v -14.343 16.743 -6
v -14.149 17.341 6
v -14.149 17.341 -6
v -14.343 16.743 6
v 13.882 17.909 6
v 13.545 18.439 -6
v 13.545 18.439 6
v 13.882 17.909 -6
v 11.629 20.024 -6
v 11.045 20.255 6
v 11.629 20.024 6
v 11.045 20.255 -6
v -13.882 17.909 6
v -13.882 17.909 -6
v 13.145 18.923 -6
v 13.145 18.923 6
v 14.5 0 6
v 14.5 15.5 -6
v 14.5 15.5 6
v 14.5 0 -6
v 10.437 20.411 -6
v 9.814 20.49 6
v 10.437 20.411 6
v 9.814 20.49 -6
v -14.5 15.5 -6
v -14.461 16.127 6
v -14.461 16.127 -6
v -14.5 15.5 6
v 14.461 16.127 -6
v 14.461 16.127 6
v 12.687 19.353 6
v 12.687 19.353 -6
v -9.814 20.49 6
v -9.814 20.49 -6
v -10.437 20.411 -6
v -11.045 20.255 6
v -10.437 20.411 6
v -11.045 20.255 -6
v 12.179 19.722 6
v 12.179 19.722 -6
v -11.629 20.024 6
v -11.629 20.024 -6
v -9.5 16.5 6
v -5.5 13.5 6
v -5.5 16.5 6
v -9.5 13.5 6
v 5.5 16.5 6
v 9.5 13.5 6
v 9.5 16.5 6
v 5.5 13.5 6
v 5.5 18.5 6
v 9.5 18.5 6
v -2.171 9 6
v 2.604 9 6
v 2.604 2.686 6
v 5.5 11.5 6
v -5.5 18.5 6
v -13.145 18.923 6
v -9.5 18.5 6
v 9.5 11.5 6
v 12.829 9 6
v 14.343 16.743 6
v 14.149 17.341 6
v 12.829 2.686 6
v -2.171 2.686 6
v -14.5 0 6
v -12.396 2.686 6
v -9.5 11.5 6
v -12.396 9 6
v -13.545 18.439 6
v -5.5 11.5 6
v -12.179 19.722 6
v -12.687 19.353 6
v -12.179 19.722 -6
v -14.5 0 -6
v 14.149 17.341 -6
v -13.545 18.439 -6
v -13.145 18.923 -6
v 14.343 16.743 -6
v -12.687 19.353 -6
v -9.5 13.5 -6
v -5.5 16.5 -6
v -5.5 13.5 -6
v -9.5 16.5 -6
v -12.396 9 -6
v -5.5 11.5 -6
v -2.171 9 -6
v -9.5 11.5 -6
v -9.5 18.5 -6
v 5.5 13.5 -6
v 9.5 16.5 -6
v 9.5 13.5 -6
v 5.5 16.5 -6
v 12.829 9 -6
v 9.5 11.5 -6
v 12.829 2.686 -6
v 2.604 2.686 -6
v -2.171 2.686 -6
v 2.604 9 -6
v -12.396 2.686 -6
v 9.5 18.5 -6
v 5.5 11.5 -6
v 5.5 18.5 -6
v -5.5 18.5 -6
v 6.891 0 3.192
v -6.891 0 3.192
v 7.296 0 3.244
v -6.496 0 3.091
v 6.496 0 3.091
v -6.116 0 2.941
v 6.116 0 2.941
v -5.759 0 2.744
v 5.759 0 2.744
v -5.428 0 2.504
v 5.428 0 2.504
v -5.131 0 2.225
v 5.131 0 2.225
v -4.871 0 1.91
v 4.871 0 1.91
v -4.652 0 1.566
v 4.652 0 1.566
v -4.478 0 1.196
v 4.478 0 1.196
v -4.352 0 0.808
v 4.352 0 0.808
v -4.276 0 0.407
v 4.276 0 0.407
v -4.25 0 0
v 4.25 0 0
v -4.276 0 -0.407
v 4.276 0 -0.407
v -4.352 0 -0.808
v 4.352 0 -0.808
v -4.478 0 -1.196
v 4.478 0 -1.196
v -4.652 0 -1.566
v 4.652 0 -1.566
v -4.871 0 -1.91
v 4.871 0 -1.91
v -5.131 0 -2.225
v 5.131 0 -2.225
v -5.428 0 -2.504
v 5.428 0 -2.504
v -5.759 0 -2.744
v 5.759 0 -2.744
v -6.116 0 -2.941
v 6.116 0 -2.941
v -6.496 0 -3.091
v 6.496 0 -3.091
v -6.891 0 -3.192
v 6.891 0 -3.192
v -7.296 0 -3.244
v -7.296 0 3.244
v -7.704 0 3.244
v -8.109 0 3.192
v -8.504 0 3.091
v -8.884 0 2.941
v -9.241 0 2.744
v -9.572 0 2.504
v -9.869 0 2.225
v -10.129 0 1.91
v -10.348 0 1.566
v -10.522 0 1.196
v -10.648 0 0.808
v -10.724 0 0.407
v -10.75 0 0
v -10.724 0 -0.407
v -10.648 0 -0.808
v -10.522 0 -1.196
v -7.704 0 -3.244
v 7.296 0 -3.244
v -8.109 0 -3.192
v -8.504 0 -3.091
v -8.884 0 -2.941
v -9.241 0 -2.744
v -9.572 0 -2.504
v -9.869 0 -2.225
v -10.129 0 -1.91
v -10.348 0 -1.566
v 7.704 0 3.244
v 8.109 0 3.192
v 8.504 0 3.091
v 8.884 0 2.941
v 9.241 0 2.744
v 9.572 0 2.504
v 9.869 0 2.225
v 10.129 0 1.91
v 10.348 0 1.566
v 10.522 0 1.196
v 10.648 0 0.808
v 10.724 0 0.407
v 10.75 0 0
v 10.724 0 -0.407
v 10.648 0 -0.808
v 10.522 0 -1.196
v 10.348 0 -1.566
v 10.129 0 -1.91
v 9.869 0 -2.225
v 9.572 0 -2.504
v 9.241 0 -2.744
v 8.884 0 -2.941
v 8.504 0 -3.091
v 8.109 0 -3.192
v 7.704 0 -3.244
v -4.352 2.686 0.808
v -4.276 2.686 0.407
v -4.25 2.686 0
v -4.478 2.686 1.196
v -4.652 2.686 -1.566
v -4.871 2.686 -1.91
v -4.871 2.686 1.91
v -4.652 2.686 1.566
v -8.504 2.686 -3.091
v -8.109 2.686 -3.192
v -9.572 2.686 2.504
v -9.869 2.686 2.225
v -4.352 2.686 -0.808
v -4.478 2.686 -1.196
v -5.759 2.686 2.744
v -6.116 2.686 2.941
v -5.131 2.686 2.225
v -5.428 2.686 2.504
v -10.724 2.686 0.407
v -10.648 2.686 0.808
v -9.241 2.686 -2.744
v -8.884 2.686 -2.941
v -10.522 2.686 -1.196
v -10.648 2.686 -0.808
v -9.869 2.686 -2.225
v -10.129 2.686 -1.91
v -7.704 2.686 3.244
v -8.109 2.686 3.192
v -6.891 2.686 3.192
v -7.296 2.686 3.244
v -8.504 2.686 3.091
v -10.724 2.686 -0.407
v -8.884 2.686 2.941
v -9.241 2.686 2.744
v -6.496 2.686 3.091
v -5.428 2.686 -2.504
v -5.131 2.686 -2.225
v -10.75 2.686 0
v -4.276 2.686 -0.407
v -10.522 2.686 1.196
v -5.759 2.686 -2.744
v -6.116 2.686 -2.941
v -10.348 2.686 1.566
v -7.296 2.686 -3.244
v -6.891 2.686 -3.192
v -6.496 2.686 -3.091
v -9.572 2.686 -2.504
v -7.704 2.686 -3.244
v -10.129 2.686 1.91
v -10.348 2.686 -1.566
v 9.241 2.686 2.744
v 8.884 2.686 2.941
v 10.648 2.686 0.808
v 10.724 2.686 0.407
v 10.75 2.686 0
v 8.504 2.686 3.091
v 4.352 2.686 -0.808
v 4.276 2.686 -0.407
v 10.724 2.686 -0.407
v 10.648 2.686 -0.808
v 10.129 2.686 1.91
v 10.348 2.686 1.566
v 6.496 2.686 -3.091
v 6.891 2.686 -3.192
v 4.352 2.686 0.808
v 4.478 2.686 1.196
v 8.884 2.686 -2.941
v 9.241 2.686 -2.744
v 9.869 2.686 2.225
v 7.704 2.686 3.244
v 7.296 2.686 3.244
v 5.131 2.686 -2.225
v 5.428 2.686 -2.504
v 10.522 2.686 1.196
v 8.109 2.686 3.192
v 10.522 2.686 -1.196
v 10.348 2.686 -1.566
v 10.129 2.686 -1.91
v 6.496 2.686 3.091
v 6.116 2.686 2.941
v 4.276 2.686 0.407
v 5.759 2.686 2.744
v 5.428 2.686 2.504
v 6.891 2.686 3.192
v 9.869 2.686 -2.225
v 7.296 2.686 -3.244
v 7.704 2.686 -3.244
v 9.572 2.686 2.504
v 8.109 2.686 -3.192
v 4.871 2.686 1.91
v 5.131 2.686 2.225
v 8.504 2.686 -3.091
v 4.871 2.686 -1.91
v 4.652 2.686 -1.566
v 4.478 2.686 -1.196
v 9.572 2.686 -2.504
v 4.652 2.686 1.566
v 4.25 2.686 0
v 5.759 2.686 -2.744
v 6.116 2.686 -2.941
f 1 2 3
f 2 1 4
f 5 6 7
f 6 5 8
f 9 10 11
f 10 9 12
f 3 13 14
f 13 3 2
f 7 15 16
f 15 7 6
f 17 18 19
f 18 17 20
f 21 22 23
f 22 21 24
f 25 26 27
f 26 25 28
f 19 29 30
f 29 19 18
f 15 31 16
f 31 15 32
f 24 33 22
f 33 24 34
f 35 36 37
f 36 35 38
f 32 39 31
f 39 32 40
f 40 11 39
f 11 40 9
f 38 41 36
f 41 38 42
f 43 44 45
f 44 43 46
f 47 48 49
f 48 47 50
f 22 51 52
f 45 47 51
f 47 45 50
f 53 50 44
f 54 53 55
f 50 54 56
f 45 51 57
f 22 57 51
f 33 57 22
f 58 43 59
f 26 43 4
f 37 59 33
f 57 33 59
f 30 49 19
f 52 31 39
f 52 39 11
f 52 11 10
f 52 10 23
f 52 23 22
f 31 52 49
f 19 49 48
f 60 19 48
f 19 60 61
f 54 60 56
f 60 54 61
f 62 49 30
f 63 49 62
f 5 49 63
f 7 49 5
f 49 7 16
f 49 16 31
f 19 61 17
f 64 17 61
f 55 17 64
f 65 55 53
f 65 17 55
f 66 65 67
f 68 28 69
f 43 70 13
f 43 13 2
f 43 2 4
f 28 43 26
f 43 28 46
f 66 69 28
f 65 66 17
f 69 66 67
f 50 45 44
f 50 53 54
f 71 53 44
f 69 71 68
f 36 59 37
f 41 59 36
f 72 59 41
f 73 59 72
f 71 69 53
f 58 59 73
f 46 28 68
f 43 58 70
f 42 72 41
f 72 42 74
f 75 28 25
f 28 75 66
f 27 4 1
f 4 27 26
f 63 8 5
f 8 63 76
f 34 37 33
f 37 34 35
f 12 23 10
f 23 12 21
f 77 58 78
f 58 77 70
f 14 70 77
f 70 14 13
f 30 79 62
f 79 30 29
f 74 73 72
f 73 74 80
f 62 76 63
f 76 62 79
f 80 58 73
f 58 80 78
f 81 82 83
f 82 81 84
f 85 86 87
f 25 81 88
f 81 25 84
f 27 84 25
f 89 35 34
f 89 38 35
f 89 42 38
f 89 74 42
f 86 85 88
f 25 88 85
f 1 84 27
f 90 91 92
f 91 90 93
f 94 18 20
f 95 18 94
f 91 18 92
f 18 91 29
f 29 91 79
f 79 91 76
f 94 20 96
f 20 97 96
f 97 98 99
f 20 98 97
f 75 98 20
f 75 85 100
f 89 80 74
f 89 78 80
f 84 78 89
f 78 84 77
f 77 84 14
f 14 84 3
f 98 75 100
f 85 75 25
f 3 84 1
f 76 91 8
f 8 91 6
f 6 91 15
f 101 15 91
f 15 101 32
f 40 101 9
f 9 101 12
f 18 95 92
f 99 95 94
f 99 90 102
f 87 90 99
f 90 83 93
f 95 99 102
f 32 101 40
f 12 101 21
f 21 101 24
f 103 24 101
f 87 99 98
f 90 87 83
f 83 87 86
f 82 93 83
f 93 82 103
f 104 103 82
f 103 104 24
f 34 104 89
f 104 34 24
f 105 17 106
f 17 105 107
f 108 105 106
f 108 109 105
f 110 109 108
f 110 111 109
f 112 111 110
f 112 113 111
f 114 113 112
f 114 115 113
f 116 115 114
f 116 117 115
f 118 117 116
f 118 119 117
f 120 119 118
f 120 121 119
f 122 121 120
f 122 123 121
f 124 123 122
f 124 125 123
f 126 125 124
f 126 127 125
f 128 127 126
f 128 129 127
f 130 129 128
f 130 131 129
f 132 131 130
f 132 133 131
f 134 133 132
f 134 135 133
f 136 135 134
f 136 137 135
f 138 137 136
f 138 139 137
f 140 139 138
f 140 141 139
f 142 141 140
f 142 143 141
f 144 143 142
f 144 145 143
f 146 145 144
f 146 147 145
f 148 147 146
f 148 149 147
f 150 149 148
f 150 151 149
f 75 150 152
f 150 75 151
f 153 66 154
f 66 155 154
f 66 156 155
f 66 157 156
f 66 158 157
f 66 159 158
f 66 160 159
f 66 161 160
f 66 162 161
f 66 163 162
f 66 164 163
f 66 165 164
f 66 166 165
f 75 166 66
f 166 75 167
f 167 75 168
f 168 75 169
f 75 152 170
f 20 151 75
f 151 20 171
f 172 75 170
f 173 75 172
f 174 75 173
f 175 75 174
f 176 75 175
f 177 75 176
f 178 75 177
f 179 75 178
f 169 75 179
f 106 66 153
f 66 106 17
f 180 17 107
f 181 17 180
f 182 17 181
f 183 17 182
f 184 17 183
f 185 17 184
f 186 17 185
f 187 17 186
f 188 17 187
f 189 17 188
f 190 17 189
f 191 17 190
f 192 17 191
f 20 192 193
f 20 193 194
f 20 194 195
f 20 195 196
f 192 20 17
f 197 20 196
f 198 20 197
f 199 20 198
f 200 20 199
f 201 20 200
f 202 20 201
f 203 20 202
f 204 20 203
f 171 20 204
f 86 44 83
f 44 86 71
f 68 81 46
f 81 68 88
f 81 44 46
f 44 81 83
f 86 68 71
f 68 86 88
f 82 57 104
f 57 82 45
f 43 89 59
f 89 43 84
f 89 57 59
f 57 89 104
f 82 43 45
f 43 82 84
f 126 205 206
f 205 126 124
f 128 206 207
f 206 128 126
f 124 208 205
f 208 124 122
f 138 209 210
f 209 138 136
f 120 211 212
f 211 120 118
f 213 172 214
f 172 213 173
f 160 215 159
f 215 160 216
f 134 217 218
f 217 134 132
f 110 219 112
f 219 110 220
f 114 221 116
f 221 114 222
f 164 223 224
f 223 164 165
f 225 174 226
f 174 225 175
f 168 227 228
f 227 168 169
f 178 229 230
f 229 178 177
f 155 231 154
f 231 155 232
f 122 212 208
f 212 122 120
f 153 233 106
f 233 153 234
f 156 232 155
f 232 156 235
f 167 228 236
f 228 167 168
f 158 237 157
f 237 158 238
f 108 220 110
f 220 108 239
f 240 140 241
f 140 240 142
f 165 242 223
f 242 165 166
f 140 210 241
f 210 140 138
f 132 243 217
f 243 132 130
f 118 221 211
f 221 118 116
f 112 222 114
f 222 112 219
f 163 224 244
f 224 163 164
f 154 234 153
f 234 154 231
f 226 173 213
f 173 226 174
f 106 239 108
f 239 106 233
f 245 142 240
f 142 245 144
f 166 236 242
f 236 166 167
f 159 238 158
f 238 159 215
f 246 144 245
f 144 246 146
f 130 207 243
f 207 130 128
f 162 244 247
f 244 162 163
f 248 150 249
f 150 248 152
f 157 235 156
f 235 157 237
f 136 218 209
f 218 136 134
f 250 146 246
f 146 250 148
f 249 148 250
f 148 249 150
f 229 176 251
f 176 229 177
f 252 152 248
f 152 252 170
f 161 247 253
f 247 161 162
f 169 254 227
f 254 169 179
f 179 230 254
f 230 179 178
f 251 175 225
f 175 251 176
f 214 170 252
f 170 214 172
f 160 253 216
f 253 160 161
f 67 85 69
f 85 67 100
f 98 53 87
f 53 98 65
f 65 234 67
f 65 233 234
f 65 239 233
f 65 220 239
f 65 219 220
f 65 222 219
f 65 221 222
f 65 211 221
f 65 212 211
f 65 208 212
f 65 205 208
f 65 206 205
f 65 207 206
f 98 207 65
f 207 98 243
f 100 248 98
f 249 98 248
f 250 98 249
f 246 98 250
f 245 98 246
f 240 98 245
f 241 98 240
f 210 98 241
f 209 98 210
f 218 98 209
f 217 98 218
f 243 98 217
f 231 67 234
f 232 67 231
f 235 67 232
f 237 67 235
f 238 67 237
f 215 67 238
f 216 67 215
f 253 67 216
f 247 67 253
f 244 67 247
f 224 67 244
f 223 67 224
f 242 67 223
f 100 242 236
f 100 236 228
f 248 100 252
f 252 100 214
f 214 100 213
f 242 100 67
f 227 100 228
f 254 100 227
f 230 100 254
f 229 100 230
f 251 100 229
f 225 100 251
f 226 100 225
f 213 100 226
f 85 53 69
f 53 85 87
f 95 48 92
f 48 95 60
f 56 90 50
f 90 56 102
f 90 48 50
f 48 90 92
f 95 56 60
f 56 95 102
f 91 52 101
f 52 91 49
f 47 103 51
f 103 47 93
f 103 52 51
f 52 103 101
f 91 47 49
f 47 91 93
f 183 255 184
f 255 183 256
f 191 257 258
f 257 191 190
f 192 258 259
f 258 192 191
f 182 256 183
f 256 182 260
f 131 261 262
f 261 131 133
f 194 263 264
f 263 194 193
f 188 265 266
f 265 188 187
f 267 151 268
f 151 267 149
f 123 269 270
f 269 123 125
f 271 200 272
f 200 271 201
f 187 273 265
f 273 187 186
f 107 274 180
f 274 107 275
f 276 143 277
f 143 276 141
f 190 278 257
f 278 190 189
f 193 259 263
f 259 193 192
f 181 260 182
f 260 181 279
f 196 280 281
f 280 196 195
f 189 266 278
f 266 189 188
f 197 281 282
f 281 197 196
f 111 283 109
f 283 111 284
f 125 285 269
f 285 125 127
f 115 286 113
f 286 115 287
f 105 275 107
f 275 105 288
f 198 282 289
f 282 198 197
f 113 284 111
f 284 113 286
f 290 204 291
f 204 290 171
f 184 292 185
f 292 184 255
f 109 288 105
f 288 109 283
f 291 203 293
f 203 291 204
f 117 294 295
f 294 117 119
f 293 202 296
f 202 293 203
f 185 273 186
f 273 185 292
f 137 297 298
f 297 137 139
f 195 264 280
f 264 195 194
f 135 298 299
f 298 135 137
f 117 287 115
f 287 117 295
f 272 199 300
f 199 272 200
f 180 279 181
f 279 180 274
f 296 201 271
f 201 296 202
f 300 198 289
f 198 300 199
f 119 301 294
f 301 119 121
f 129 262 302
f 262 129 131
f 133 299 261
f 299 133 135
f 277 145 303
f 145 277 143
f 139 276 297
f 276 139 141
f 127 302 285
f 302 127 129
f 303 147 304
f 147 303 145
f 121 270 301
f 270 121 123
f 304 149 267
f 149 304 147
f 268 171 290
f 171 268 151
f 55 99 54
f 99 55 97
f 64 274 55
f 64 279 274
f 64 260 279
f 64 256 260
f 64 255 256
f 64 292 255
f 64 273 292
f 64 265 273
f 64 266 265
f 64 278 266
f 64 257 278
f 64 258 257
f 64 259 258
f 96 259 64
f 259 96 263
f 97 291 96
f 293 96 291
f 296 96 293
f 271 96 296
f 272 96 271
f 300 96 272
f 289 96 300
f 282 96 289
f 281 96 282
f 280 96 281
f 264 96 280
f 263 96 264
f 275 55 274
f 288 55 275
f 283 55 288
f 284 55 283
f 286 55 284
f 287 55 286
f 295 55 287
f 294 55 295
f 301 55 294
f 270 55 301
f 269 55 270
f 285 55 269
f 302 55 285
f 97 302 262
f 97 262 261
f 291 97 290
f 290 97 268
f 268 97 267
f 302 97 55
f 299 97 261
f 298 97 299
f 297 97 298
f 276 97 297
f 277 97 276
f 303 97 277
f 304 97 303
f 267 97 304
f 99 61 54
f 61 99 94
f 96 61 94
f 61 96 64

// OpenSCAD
$fn = 50;


difference() {
	union() {
		translate(v = [0, 13.5000000000, -6.0000000000]) {
			rotate(a = [0, 0, 0]) {
				hull() {
					translate(v = [-9.5000000000, 2.0000000000, 0]) {
						rotate(a = [0, 0, 0]) {
							translate(v = [0, 0, 0]) {
								rotate(a = [0, 0, 0]) {
									cylinder(h = 12, r = 5);
								}
							}
						}
					}
					translate(v = [9.5000000000, 2.0000000000, 0]) {
						rotate(a = [0, 0, 0]) {
							translate(v = [0, 0, 0]) {
								rotate(a = [0, 0, 0]) {
									cylinder(h = 12, r = 5);
								}
							}
						}
					}
					translate(v = [-9.5000000000, -2.0000000000, 0]) {
						rotate(a = [0, 0, 0]) {
							translate(v = [0, 0, 0]) {
								rotate(a = [0, 0, 0]) {
									cylinder(h = 12, r = 5);
								}
							}
						}
					}
					translate(v = [9.5000000000, -2.0000000000, 0]) {
						rotate(a = [0, 0, 0]) {
							translate(v = [0, 0, 0]) {
								rotate(a = [0, 0, 0]) {
									cylinder(h = 12, r = 5);
								}
							}
						}
					}
				}
			}
		}
		translate(v = [-14.5000000000, 0, -6.0000000000]) {
			rotate(a = [0, 0, 0]) {
				cube(size = [29, 13.5000000000, 12]);
			}
		}
	}
	union() {
		translate(v = [-9.5000000000, 11.5000000000, -50]) {
			rotate(a = [0, 0, 0]) {
				cube(size = [4, 2, 100]);
			}
		}
		translate(v = [-9.5000000000, 16.5000000000, -50]) {
			rotate(a = [0, 0, 0]) {
				cube(size = [4, 2, 100]);
			}
		}
		translate(v = [-7.5000000000, 8, 0]) {
			rotate(a = [90, 0, 0]) {
				cylinder(h = 8, r = 3.2500000000);
			}
		}
		translate(v = [-12.3960138648, 9, -50]) {
			rotate(a = [90, 0, 0]) {
				cube(size = [10.2253032929, 100, 6.3142500000]);
			}
		}
		translate(v = [5.5000000000, 11.5000000000, -50]) {
			rotate(a = [0, 0, 0]) {
				cube(size = [4, 2, 100]);
			}
		}
		translate(v = [5.5000000000, 16.5000000000, -50]) {
			rotate(a = [0, 0, 0]) {
				cube(size = [4, 2, 100]);
			}
		}
		translate(v = [7.5000000000, 8, 0]) {
			rotate(a = [90, 0, 0]) {
				cylinder(h = 8, r = 3.2500000000);
			}
		}
		translate(v = [2.6039861352, 9, -50]) {
			rotate(a = [90, 0, 0]) {
				cube(size = [10.2253032929, 100, 6.3142500000]);
			}
		}
	}
}
